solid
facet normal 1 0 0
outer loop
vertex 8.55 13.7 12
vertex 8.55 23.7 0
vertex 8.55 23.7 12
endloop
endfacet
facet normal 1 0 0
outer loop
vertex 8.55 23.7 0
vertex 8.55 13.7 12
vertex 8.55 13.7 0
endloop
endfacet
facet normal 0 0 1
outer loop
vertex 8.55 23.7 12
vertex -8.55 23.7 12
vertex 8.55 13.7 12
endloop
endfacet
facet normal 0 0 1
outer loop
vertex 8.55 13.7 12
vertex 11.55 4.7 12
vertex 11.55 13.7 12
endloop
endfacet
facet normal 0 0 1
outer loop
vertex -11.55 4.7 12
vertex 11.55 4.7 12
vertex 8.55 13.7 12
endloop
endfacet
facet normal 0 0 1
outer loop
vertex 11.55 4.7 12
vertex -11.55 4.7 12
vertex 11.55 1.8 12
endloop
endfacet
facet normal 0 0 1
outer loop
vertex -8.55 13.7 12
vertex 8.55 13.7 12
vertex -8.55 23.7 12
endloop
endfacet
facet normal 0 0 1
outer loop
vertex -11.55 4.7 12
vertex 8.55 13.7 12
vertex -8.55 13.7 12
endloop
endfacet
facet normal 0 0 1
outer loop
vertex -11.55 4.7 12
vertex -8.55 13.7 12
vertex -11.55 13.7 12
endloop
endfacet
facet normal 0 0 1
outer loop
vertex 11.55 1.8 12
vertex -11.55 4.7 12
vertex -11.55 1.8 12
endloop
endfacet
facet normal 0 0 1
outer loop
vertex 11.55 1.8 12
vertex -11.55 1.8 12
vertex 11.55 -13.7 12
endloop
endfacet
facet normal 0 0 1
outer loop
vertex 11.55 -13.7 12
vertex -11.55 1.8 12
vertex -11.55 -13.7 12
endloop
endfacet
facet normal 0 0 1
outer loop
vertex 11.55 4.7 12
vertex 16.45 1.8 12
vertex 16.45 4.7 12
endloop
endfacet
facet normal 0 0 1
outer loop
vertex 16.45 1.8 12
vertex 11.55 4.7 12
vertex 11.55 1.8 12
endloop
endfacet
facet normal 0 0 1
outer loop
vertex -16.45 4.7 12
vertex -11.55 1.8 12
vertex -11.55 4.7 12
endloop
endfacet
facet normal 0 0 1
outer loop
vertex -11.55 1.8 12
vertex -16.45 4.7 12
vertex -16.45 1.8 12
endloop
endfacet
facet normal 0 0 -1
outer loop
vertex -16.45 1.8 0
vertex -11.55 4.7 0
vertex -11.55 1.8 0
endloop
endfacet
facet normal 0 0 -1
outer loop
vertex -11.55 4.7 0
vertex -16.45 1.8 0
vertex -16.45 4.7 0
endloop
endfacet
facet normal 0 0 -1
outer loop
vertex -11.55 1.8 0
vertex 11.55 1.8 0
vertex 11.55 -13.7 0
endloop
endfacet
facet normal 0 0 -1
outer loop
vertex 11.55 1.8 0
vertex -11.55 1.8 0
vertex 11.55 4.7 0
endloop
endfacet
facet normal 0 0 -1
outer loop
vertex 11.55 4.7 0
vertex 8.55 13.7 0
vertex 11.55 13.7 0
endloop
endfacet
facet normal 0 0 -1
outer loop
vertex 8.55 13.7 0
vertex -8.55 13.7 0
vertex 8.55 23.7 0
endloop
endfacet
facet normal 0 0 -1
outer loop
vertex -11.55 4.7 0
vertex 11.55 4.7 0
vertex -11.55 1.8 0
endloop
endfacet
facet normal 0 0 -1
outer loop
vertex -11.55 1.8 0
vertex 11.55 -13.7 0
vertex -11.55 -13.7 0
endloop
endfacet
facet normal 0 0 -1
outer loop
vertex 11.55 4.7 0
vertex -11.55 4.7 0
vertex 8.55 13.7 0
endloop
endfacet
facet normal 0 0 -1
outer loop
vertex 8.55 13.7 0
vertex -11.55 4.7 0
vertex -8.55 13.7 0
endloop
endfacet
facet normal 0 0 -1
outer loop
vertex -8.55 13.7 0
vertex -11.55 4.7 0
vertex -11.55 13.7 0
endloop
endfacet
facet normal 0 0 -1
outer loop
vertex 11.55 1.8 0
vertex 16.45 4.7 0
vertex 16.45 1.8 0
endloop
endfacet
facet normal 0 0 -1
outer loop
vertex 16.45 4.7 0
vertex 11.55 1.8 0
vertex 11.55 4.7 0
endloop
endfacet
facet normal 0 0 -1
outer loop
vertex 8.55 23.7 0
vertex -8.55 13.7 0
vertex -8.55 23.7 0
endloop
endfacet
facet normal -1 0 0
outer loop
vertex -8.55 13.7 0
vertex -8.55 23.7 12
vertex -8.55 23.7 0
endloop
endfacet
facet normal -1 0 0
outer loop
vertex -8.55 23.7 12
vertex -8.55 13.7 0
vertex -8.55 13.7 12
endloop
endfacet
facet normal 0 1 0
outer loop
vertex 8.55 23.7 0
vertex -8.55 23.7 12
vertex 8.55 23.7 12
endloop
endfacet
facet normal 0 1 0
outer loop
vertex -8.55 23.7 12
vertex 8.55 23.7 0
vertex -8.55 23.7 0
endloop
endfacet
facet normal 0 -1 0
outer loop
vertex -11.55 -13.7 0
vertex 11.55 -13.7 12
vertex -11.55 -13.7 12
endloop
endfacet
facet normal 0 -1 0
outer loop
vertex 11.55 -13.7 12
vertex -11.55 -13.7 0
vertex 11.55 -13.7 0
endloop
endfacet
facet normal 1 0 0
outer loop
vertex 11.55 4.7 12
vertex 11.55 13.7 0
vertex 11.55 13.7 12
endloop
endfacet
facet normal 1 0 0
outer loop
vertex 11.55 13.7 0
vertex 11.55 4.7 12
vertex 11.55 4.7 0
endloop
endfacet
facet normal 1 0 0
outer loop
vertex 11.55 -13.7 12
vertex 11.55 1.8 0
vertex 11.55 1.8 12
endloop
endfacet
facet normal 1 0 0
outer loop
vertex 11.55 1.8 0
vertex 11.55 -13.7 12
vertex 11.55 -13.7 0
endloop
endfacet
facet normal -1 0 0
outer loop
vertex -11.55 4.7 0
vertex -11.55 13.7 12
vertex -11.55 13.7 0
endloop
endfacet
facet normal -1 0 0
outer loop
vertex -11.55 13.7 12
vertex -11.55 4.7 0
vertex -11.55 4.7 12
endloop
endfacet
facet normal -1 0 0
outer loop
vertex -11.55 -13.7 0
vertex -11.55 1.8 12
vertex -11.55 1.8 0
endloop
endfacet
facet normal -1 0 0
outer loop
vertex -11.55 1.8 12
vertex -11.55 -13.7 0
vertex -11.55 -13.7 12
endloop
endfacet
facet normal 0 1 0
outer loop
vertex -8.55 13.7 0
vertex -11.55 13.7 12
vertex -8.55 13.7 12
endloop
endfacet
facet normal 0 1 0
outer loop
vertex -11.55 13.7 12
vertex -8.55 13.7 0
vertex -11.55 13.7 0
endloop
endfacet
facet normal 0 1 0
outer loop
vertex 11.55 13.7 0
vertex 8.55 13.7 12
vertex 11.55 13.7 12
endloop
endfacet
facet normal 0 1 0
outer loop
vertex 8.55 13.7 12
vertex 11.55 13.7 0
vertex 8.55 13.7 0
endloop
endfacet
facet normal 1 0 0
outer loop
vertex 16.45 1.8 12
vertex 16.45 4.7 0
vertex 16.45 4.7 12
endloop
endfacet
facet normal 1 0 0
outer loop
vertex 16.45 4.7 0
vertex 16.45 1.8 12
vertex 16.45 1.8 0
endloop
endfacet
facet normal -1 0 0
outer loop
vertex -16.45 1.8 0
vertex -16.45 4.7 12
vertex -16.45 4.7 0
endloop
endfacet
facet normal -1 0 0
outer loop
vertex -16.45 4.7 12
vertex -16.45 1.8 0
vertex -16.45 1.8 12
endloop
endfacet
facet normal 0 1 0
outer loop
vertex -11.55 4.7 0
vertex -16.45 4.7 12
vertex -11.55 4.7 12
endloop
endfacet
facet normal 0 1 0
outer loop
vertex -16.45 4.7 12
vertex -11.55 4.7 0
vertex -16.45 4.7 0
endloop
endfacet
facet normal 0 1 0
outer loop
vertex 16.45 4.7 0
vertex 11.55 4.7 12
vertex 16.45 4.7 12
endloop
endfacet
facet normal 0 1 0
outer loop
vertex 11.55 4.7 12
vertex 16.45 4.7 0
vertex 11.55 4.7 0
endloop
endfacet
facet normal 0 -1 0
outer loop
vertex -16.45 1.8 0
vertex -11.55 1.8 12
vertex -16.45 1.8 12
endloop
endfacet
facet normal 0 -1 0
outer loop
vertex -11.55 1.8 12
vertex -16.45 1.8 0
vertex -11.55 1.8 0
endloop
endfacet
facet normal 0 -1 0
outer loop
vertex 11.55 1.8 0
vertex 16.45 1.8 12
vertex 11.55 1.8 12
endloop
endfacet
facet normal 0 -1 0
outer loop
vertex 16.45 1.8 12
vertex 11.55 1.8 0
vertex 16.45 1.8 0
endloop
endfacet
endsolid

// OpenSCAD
breedte = 22.7;
hele_breedte = 32.5;
diepte = 27;
dikte_rand = 2.5;
marge = 0.2;

difference(){
	union(){
        
        translate([-(hele_breedte+marge*2)/2,-(diepte+marge*2)/2,0]){

            translate([(hele_breedte-breedte)/2+3,0,0]){
                cube([breedte+marge*2-6,diepte+marge*2+10,12], center=false);
            }         

            translate([(hele_breedte-breedte)/2,0,0]){
                cube([breedte+marge*2,diepte+marge*2+0,12], center=false);
            }         
            translate([0,15.5,0]){
                cube([hele_breedte+marge*2,dikte_rand+marge*2,12], center=false);
            }         
        }


	}
	union() {

	}
}
